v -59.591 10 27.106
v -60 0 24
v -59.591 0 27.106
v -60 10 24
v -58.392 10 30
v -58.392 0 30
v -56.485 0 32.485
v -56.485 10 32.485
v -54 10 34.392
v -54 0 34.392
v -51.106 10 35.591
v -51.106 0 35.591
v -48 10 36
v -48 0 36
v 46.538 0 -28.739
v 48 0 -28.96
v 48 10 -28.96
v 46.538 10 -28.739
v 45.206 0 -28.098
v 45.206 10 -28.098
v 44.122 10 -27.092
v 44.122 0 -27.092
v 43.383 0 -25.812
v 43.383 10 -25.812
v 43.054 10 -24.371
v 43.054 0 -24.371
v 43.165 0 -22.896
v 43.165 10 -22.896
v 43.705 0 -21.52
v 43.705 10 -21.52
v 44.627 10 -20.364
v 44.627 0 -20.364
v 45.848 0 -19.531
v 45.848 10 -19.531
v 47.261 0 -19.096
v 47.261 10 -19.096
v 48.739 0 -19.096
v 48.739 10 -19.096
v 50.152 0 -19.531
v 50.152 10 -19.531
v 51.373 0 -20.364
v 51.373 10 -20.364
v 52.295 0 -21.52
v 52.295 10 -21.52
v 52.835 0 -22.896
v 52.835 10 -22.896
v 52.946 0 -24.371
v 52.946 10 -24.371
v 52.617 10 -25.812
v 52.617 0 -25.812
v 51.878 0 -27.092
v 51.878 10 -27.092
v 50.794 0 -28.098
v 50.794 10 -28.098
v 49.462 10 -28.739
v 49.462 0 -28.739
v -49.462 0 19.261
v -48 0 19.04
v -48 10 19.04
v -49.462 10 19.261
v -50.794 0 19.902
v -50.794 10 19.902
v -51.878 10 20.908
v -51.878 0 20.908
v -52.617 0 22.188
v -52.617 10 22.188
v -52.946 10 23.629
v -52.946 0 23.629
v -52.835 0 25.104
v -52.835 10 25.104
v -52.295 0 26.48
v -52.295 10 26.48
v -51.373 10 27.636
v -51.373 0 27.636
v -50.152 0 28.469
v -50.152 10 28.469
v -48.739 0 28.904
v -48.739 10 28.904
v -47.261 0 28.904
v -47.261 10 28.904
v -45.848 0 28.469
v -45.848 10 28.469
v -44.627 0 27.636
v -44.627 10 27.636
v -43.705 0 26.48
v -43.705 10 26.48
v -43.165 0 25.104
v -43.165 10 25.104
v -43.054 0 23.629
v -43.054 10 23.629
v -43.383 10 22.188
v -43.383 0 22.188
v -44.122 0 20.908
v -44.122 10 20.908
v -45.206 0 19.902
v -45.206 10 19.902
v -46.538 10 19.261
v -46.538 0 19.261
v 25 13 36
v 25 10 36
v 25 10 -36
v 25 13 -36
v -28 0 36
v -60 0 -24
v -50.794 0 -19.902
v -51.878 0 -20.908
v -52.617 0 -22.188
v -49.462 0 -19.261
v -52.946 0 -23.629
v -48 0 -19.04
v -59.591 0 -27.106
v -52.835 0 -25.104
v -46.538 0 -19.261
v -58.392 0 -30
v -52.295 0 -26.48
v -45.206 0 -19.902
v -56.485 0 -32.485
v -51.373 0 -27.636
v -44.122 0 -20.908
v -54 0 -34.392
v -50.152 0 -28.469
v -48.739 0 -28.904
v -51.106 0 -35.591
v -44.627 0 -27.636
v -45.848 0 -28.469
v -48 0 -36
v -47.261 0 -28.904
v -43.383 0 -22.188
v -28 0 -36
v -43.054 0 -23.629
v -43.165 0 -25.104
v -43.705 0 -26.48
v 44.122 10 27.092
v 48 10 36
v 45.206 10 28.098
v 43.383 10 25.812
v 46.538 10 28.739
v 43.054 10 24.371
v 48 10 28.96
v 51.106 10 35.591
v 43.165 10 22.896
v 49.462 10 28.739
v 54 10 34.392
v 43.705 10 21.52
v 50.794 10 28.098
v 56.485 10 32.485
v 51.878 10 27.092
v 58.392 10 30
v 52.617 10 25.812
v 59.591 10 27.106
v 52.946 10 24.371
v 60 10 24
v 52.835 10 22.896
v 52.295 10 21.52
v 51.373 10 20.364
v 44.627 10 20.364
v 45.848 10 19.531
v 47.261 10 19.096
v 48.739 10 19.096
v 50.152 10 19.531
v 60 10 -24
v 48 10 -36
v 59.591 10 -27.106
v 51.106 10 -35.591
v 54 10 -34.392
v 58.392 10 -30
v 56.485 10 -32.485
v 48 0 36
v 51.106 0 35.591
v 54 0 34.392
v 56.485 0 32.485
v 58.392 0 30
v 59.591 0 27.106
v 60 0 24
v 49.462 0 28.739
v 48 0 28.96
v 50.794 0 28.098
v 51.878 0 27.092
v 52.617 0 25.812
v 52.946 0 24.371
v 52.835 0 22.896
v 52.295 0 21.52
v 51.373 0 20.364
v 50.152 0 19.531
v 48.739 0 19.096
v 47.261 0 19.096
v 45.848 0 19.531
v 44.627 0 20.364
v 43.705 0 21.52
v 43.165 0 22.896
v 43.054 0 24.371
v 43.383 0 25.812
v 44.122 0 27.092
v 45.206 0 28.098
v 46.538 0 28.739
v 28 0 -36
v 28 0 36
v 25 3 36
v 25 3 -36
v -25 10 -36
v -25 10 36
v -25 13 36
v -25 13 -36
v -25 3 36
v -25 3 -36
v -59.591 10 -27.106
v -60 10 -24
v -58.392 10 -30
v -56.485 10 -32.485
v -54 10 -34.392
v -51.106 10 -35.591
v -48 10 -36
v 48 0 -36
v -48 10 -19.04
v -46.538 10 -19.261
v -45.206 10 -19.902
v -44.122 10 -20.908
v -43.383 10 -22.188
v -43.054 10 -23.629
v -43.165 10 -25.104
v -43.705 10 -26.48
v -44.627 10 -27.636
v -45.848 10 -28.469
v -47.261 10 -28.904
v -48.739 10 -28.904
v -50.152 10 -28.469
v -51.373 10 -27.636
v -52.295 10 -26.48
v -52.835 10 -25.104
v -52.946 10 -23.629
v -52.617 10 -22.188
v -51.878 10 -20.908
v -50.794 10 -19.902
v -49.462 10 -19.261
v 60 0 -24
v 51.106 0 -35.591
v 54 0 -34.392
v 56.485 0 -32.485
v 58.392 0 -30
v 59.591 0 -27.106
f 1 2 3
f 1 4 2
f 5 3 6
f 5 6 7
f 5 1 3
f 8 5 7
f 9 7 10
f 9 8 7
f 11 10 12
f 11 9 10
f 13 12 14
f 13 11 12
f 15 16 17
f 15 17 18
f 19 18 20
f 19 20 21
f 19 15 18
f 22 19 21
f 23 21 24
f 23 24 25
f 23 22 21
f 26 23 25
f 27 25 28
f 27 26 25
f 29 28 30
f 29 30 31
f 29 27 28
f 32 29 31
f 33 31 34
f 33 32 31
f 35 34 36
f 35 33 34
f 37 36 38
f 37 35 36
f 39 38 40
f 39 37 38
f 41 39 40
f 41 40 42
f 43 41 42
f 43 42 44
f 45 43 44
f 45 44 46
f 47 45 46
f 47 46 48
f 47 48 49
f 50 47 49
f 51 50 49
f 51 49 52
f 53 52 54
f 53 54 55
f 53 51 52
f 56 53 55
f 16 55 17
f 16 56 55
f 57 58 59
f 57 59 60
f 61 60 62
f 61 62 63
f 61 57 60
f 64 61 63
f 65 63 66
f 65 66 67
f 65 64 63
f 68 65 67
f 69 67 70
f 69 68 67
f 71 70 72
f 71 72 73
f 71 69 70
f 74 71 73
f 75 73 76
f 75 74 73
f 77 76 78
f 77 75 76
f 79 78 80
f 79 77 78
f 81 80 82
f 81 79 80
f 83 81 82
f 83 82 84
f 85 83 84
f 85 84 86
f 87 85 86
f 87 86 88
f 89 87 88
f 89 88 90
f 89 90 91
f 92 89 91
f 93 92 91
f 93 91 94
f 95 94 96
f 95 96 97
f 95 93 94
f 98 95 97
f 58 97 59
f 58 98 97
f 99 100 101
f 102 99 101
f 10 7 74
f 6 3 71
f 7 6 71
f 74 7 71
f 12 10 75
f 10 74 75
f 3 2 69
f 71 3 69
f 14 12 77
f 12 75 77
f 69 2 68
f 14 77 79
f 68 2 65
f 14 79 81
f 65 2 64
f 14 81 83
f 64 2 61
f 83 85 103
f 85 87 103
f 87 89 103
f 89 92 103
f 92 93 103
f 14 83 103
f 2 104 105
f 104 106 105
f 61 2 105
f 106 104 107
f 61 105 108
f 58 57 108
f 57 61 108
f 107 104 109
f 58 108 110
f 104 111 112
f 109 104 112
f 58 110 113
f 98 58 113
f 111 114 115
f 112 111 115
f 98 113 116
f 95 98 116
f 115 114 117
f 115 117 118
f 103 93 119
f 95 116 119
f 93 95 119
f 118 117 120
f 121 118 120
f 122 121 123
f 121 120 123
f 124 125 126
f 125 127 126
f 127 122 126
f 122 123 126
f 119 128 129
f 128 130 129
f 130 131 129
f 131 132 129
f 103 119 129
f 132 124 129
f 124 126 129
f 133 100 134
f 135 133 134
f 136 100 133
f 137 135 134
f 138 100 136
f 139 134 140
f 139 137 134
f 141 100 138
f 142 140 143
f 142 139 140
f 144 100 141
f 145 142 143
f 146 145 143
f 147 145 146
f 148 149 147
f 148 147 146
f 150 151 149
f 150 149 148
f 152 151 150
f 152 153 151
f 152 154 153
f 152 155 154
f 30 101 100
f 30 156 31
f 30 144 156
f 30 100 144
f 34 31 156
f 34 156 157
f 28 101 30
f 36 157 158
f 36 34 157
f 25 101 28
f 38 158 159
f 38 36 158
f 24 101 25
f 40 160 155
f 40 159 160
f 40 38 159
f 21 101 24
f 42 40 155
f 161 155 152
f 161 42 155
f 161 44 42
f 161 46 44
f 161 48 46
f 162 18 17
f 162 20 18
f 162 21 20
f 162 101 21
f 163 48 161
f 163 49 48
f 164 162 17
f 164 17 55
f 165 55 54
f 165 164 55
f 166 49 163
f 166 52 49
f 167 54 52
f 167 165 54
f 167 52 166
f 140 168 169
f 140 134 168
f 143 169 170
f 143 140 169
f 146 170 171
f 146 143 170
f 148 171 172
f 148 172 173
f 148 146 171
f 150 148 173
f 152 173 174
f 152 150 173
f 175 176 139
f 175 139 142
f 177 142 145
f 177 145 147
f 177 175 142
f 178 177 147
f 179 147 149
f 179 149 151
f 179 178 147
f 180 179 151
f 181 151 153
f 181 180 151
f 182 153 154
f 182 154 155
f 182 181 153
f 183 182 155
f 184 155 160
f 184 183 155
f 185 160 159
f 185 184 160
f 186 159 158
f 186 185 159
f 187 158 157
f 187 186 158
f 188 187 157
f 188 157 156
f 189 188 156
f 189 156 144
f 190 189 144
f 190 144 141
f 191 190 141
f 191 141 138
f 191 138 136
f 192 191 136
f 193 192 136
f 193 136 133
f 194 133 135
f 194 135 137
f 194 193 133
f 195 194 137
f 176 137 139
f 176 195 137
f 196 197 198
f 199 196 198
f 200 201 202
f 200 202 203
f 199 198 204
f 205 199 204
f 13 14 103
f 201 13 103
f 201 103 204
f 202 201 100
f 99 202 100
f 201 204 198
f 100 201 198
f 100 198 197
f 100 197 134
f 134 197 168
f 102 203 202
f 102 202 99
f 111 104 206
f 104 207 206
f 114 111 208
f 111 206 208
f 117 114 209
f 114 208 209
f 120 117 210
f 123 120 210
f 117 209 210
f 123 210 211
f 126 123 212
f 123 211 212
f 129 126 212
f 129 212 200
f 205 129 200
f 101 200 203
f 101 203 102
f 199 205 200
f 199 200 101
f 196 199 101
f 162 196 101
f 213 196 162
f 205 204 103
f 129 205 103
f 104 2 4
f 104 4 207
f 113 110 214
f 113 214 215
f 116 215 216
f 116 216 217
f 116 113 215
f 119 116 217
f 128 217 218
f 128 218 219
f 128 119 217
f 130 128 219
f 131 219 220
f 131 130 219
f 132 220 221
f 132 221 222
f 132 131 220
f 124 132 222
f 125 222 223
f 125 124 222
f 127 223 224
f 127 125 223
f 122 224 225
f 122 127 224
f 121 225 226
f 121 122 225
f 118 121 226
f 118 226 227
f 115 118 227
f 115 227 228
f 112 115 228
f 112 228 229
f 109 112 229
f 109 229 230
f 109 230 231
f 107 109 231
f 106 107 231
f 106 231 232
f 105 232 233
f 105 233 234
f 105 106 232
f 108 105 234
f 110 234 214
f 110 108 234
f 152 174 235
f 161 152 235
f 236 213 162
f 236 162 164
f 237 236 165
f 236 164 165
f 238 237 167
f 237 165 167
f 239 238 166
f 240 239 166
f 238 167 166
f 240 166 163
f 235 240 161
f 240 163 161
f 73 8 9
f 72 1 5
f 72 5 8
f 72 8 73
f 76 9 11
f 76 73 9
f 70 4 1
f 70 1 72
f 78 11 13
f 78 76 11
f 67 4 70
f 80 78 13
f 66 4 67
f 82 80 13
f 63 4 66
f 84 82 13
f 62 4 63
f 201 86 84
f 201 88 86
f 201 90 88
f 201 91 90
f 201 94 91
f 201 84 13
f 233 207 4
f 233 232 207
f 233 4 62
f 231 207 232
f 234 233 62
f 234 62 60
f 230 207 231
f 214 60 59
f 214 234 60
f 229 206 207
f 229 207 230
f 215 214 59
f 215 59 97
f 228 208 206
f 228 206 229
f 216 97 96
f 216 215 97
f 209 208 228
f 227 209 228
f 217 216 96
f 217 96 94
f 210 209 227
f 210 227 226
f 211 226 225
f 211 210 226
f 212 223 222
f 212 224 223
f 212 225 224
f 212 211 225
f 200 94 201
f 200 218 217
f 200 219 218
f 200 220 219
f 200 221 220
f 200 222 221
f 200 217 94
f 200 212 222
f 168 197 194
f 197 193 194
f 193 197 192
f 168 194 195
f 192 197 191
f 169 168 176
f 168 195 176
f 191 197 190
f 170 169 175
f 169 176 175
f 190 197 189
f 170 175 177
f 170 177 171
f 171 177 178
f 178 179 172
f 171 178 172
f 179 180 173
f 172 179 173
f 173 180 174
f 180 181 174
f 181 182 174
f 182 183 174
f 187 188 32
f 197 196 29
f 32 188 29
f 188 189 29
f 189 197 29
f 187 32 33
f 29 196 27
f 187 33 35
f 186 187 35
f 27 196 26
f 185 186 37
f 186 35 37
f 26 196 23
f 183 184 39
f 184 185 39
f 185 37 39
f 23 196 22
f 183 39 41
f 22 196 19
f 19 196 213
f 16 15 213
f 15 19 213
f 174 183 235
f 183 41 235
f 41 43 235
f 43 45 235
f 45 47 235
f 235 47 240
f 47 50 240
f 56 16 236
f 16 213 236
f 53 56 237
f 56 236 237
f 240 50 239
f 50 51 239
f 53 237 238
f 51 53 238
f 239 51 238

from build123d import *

# Parameters (mm, degrees)
SKETCH1_W           = 120
SKETCH1_H           = 72
SKETCH1_R           = 4.95970326
BOSS_EXTRUDE1_DEPTH = 10
FILLET1_R           = 12
CUT_EXTRUDE1_DEPTH  = 73
SKETCH3_W           = 50
SKETCH3_H           = 72
BOSS_EXTRUDE2_DEPTH = 3


with BuildPart() as part:
    # Sketch1 → Boss-Extrude1 (new body)
    with BuildSketch(Plane(origin=(0, 0, 0), x_dir=(1, 0, 0), z_dir=(0, 1, 0))):
        Rectangle(SKETCH1_W, SKETCH1_H)
        with Locations(Location((-48, 24, 0), (0, 0, 270))):
            Circle(SKETCH1_R, mode=Mode.SUBTRACT)
        with Locations(Location((48, 24, 0), (0, 0, 90))):
            Circle(SKETCH1_R, mode=Mode.SUBTRACT)
        with Locations(Location((48, -24, 0), (0, 0, 270))):
            Circle(SKETCH1_R, mode=Mode.SUBTRACT)
        with Locations(Location((-48, -24, 0), (0, 0, 90))):
            Circle(SKETCH1_R, mode=Mode.SUBTRACT)
    extrude(amount=BOSS_EXTRUDE1_DEPTH)

    # Fillet1
    fillet1_edges = [part.edges().sort_by_distance(p)[0] for p in [
        (60, 5, 36),
        (-60, 5, 36),
        (-60, 5, -36),
        (60, 5, -36),
    ]]
    fillet(fillet1_edges, radius=FILLET1_R)

    # Sketch2 → Cut-Extrude1 (cut)
    with BuildSketch(Plane.XY.offset(36)):
        Polygon((-28, 0), (0, 0), (0, 3), (-25, 3), align=None)
        Polygon((0, 3), (0, 0), (28, 0), (25, 3), align=None)
    extrude(amount=-CUT_EXTRUDE1_DEPTH, mode=Mode.SUBTRACT)

    # Sketch3 → Boss-Extrude2 (add)
    with BuildSketch(Plane(origin=(0, 10, 0), x_dir=(1, 0, 0), z_dir=(0, 1, 0))):
        Rectangle(SKETCH3_W, SKETCH3_H)
    extrude(amount=BOSS_EXTRUDE2_DEPTH)


solid = part.part
